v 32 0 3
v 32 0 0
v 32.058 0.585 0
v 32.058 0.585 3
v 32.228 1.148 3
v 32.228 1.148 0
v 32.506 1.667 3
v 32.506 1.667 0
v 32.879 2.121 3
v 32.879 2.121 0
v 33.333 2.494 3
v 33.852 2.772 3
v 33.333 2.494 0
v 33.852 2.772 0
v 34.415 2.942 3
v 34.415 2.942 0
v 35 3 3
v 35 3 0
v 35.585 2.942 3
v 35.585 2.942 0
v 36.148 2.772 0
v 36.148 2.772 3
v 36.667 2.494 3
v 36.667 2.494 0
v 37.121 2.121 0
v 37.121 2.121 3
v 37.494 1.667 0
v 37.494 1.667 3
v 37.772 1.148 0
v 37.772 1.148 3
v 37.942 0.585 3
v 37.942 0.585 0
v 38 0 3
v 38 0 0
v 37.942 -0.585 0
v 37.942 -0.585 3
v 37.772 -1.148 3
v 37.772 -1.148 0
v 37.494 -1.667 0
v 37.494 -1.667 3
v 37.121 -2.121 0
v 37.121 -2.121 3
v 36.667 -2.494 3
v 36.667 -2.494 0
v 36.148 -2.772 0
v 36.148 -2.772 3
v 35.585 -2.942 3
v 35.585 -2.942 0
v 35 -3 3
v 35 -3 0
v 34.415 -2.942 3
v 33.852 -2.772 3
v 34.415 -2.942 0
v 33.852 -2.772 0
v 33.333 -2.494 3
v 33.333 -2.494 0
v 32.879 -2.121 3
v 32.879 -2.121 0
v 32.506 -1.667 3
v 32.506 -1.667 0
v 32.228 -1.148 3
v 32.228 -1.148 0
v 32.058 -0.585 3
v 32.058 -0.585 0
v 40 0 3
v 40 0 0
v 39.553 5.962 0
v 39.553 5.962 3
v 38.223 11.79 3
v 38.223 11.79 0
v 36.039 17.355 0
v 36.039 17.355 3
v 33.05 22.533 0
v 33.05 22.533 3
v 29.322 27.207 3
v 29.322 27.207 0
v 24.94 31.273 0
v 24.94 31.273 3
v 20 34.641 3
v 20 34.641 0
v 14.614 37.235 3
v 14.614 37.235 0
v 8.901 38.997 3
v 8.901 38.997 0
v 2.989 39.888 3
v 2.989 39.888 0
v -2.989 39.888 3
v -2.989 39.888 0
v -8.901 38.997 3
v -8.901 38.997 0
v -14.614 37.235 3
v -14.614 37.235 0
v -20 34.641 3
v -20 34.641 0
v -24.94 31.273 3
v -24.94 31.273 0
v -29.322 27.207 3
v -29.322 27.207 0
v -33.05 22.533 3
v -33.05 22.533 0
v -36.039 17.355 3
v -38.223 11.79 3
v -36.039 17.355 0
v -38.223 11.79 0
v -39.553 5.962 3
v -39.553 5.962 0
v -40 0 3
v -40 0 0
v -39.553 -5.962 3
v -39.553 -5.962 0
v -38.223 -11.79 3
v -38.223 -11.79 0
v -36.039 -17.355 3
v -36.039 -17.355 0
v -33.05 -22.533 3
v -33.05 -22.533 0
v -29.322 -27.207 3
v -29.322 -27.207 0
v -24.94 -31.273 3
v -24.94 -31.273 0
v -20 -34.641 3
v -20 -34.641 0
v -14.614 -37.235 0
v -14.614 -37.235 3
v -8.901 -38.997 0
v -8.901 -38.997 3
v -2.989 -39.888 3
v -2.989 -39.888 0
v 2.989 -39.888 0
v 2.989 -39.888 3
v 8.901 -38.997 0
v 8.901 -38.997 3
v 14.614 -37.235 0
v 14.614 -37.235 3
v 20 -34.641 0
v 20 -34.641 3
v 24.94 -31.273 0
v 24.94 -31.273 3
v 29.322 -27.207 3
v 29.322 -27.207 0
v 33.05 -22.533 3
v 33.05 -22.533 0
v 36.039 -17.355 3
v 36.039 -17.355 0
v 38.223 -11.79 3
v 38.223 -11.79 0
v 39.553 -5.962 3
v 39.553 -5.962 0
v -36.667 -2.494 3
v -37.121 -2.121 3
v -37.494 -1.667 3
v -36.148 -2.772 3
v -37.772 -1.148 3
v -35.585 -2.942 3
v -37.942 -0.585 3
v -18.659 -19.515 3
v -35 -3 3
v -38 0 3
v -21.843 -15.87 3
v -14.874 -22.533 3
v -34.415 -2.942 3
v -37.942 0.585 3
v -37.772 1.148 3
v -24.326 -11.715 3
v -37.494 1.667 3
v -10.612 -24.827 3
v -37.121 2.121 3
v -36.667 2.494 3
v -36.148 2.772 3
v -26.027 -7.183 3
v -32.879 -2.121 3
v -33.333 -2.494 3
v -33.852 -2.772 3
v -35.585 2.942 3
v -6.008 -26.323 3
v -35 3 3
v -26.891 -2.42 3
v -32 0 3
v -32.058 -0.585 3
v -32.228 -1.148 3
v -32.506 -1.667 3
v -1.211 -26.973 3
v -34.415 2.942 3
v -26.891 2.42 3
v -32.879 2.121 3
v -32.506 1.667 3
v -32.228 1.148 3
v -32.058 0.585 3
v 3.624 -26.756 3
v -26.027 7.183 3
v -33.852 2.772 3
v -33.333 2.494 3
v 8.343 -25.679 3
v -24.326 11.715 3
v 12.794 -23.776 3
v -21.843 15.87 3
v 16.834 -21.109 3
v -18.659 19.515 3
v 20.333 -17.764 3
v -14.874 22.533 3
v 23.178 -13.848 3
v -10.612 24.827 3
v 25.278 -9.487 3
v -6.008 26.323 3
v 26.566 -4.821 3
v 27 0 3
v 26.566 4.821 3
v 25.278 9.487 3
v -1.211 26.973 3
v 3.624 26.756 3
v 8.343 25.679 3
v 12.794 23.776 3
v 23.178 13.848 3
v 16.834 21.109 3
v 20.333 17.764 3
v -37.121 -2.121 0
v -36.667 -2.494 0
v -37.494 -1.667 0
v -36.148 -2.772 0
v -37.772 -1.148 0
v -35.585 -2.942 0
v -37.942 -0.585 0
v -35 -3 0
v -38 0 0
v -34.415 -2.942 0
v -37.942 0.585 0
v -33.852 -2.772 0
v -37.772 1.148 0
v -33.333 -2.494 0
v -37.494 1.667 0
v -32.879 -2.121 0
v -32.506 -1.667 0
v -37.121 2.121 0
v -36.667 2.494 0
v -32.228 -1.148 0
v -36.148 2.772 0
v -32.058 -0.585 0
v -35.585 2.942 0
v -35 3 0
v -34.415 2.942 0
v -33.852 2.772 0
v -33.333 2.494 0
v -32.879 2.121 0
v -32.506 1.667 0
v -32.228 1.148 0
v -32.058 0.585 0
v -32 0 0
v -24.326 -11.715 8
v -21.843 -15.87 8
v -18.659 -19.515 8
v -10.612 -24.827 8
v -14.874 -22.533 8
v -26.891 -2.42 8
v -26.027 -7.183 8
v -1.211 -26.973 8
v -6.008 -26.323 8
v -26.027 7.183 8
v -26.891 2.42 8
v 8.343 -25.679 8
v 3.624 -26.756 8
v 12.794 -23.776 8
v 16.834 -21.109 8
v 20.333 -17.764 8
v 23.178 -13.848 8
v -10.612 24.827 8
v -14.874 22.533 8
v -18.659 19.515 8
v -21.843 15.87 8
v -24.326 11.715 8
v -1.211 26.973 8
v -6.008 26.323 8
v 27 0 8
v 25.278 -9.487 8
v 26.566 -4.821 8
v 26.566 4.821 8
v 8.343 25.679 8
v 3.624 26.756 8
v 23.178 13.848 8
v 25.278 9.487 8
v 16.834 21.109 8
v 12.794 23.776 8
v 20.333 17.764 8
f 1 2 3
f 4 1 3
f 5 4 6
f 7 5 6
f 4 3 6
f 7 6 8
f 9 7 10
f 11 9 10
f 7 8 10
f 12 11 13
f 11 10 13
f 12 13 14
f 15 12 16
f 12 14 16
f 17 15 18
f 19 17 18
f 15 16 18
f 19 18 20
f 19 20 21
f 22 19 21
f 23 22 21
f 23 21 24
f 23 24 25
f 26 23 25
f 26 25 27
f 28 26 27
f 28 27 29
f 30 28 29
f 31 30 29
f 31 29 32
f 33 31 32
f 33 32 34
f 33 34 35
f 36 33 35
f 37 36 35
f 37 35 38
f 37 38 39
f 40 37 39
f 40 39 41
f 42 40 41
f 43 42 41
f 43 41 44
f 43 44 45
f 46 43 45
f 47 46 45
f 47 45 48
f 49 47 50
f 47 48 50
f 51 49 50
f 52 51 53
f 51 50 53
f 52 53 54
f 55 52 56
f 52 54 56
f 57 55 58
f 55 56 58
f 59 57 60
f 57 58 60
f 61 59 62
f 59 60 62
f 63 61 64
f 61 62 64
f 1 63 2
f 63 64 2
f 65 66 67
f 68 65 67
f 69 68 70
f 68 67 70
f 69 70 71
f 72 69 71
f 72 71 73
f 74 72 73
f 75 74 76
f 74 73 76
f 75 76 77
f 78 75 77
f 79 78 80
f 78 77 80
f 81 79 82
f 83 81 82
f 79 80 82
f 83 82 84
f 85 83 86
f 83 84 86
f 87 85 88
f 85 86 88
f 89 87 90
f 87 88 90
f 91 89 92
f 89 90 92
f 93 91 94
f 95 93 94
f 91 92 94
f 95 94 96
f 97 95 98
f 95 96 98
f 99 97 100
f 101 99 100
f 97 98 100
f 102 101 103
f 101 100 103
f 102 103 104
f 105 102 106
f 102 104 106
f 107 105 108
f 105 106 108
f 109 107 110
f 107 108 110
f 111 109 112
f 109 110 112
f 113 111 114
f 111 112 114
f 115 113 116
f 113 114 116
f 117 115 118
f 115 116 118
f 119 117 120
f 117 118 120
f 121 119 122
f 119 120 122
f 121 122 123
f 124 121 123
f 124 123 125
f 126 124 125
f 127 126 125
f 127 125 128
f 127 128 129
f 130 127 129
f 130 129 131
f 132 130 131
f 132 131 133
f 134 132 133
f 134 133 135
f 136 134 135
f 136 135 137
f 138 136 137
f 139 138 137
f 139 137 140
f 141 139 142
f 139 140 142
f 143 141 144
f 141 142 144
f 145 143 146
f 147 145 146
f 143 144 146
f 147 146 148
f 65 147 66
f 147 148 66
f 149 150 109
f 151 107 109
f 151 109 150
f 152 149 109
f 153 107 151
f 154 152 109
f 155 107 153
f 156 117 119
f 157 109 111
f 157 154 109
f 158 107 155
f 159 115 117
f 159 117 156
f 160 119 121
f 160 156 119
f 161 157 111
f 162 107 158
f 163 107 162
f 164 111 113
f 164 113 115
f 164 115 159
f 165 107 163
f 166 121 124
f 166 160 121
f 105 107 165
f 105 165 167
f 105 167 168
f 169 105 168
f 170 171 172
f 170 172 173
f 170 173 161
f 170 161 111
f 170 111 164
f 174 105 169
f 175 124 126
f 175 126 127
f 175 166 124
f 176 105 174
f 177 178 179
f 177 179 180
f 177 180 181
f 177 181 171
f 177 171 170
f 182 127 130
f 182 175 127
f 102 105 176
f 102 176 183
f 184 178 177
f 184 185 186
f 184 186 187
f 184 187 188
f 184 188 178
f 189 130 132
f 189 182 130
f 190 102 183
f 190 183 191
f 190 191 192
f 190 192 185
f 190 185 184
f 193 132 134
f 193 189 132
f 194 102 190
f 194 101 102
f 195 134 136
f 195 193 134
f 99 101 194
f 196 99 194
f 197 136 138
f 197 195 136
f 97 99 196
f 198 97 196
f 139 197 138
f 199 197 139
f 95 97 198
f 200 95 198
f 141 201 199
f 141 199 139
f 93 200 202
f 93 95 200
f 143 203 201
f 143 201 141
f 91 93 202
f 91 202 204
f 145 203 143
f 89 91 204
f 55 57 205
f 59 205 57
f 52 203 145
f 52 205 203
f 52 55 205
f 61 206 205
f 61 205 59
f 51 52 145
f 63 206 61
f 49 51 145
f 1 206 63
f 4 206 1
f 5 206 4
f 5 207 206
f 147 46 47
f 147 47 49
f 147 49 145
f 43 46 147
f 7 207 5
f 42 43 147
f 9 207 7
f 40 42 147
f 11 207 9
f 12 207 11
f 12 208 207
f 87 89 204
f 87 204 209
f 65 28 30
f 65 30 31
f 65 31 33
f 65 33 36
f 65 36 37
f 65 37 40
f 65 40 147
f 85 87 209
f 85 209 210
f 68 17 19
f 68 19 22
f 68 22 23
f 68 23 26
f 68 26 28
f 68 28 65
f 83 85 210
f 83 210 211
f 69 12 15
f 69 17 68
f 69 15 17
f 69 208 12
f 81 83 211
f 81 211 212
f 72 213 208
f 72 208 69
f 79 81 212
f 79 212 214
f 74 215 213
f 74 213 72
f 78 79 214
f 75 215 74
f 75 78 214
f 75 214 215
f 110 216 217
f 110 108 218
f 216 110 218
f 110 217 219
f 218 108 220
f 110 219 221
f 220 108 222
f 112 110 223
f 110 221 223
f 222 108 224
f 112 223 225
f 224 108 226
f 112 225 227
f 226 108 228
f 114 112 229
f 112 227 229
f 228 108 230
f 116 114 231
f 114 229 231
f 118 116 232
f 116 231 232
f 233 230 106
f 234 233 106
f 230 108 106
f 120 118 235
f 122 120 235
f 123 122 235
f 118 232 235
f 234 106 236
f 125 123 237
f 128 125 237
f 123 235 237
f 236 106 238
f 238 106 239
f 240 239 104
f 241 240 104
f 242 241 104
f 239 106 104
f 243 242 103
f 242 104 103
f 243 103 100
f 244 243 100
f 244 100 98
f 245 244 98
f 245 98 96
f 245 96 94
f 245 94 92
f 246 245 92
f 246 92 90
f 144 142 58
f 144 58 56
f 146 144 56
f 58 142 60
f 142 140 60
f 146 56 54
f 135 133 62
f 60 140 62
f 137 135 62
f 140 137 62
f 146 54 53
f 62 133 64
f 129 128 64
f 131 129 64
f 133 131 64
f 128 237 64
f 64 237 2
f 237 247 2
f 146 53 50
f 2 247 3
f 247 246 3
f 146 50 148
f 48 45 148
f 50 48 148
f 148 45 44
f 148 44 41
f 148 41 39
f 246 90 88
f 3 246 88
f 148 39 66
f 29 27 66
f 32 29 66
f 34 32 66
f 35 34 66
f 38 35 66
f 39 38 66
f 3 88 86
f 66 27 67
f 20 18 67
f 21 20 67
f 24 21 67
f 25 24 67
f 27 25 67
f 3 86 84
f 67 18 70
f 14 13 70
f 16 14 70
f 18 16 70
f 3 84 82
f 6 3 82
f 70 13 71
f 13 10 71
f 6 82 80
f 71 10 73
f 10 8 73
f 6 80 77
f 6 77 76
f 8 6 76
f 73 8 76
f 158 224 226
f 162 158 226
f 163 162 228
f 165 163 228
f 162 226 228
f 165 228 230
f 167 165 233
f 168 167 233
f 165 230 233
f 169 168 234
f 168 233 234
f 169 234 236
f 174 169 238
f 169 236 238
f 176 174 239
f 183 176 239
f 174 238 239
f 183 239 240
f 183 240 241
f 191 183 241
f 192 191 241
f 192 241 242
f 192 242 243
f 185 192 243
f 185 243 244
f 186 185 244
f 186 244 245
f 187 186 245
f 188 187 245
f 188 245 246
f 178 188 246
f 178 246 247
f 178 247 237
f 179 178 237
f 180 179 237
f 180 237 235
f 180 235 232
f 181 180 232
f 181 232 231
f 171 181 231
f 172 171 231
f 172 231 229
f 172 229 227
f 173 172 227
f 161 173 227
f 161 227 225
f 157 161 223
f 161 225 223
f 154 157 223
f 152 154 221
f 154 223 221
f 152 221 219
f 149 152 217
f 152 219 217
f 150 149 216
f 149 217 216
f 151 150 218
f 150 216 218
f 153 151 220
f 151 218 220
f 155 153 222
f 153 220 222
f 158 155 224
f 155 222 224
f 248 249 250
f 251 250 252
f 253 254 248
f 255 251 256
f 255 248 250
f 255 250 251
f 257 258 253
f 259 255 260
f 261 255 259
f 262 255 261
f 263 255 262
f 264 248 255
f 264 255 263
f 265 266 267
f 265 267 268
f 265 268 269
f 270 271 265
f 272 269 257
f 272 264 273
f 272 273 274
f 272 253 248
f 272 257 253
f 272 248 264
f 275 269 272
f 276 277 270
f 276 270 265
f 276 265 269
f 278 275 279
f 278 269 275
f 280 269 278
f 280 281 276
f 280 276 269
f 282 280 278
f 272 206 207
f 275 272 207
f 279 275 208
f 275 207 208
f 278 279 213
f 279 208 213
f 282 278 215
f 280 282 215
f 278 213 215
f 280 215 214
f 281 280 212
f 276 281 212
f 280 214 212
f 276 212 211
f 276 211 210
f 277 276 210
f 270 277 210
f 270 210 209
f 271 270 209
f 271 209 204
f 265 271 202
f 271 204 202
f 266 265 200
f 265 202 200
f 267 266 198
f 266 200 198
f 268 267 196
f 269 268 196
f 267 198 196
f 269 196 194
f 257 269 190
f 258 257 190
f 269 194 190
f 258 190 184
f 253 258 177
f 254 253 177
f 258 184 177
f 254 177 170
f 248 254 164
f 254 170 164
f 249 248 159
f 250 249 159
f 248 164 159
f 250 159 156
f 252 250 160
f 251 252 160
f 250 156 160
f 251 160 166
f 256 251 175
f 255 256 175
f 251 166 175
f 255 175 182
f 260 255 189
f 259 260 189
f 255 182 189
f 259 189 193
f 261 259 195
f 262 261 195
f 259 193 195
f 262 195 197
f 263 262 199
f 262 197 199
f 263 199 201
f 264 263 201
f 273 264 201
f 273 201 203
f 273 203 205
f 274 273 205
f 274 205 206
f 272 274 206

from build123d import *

# Parameters (mm, degrees)
SKETCH_1_R          = 40
EXTRUDE_1_DEPTH     = 3
SKETCH_2_R          = 27
EXTRUDE_2_DEPTH     = 5
SKETCH_3_R          = 3
CUT_EXTRUDE_1_DEPTH = 5


with BuildPart() as part:
    # 草图1 → 凸台-拉伸1 (new body)
    with BuildSketch(Plane.XY):
        Circle(SKETCH_1_R)
    extrude(amount=EXTRUDE_1_DEPTH)

    # 草图2 → 凸台-拉伸2 (add)
    with BuildSketch(Plane.XY.offset(3)):
        Circle(SKETCH_2_R)
    extrude(amount=EXTRUDE_2_DEPTH)

    # 草图3 → 切除-拉伸1 (cut)
    with BuildSketch(Plane(origin=(0, 0, 0), x_dir=(-1, 0, 0), z_dir=(0, 0, -1))):
        with Locations((35, 0)):
            Circle(SKETCH_3_R)
        with Locations((-35, 0)):
            Circle(SKETCH_3_R)
    extrude(amount=-CUT_EXTRUDE_1_DEPTH, mode=Mode.SUBTRACT)


solid = part.part
